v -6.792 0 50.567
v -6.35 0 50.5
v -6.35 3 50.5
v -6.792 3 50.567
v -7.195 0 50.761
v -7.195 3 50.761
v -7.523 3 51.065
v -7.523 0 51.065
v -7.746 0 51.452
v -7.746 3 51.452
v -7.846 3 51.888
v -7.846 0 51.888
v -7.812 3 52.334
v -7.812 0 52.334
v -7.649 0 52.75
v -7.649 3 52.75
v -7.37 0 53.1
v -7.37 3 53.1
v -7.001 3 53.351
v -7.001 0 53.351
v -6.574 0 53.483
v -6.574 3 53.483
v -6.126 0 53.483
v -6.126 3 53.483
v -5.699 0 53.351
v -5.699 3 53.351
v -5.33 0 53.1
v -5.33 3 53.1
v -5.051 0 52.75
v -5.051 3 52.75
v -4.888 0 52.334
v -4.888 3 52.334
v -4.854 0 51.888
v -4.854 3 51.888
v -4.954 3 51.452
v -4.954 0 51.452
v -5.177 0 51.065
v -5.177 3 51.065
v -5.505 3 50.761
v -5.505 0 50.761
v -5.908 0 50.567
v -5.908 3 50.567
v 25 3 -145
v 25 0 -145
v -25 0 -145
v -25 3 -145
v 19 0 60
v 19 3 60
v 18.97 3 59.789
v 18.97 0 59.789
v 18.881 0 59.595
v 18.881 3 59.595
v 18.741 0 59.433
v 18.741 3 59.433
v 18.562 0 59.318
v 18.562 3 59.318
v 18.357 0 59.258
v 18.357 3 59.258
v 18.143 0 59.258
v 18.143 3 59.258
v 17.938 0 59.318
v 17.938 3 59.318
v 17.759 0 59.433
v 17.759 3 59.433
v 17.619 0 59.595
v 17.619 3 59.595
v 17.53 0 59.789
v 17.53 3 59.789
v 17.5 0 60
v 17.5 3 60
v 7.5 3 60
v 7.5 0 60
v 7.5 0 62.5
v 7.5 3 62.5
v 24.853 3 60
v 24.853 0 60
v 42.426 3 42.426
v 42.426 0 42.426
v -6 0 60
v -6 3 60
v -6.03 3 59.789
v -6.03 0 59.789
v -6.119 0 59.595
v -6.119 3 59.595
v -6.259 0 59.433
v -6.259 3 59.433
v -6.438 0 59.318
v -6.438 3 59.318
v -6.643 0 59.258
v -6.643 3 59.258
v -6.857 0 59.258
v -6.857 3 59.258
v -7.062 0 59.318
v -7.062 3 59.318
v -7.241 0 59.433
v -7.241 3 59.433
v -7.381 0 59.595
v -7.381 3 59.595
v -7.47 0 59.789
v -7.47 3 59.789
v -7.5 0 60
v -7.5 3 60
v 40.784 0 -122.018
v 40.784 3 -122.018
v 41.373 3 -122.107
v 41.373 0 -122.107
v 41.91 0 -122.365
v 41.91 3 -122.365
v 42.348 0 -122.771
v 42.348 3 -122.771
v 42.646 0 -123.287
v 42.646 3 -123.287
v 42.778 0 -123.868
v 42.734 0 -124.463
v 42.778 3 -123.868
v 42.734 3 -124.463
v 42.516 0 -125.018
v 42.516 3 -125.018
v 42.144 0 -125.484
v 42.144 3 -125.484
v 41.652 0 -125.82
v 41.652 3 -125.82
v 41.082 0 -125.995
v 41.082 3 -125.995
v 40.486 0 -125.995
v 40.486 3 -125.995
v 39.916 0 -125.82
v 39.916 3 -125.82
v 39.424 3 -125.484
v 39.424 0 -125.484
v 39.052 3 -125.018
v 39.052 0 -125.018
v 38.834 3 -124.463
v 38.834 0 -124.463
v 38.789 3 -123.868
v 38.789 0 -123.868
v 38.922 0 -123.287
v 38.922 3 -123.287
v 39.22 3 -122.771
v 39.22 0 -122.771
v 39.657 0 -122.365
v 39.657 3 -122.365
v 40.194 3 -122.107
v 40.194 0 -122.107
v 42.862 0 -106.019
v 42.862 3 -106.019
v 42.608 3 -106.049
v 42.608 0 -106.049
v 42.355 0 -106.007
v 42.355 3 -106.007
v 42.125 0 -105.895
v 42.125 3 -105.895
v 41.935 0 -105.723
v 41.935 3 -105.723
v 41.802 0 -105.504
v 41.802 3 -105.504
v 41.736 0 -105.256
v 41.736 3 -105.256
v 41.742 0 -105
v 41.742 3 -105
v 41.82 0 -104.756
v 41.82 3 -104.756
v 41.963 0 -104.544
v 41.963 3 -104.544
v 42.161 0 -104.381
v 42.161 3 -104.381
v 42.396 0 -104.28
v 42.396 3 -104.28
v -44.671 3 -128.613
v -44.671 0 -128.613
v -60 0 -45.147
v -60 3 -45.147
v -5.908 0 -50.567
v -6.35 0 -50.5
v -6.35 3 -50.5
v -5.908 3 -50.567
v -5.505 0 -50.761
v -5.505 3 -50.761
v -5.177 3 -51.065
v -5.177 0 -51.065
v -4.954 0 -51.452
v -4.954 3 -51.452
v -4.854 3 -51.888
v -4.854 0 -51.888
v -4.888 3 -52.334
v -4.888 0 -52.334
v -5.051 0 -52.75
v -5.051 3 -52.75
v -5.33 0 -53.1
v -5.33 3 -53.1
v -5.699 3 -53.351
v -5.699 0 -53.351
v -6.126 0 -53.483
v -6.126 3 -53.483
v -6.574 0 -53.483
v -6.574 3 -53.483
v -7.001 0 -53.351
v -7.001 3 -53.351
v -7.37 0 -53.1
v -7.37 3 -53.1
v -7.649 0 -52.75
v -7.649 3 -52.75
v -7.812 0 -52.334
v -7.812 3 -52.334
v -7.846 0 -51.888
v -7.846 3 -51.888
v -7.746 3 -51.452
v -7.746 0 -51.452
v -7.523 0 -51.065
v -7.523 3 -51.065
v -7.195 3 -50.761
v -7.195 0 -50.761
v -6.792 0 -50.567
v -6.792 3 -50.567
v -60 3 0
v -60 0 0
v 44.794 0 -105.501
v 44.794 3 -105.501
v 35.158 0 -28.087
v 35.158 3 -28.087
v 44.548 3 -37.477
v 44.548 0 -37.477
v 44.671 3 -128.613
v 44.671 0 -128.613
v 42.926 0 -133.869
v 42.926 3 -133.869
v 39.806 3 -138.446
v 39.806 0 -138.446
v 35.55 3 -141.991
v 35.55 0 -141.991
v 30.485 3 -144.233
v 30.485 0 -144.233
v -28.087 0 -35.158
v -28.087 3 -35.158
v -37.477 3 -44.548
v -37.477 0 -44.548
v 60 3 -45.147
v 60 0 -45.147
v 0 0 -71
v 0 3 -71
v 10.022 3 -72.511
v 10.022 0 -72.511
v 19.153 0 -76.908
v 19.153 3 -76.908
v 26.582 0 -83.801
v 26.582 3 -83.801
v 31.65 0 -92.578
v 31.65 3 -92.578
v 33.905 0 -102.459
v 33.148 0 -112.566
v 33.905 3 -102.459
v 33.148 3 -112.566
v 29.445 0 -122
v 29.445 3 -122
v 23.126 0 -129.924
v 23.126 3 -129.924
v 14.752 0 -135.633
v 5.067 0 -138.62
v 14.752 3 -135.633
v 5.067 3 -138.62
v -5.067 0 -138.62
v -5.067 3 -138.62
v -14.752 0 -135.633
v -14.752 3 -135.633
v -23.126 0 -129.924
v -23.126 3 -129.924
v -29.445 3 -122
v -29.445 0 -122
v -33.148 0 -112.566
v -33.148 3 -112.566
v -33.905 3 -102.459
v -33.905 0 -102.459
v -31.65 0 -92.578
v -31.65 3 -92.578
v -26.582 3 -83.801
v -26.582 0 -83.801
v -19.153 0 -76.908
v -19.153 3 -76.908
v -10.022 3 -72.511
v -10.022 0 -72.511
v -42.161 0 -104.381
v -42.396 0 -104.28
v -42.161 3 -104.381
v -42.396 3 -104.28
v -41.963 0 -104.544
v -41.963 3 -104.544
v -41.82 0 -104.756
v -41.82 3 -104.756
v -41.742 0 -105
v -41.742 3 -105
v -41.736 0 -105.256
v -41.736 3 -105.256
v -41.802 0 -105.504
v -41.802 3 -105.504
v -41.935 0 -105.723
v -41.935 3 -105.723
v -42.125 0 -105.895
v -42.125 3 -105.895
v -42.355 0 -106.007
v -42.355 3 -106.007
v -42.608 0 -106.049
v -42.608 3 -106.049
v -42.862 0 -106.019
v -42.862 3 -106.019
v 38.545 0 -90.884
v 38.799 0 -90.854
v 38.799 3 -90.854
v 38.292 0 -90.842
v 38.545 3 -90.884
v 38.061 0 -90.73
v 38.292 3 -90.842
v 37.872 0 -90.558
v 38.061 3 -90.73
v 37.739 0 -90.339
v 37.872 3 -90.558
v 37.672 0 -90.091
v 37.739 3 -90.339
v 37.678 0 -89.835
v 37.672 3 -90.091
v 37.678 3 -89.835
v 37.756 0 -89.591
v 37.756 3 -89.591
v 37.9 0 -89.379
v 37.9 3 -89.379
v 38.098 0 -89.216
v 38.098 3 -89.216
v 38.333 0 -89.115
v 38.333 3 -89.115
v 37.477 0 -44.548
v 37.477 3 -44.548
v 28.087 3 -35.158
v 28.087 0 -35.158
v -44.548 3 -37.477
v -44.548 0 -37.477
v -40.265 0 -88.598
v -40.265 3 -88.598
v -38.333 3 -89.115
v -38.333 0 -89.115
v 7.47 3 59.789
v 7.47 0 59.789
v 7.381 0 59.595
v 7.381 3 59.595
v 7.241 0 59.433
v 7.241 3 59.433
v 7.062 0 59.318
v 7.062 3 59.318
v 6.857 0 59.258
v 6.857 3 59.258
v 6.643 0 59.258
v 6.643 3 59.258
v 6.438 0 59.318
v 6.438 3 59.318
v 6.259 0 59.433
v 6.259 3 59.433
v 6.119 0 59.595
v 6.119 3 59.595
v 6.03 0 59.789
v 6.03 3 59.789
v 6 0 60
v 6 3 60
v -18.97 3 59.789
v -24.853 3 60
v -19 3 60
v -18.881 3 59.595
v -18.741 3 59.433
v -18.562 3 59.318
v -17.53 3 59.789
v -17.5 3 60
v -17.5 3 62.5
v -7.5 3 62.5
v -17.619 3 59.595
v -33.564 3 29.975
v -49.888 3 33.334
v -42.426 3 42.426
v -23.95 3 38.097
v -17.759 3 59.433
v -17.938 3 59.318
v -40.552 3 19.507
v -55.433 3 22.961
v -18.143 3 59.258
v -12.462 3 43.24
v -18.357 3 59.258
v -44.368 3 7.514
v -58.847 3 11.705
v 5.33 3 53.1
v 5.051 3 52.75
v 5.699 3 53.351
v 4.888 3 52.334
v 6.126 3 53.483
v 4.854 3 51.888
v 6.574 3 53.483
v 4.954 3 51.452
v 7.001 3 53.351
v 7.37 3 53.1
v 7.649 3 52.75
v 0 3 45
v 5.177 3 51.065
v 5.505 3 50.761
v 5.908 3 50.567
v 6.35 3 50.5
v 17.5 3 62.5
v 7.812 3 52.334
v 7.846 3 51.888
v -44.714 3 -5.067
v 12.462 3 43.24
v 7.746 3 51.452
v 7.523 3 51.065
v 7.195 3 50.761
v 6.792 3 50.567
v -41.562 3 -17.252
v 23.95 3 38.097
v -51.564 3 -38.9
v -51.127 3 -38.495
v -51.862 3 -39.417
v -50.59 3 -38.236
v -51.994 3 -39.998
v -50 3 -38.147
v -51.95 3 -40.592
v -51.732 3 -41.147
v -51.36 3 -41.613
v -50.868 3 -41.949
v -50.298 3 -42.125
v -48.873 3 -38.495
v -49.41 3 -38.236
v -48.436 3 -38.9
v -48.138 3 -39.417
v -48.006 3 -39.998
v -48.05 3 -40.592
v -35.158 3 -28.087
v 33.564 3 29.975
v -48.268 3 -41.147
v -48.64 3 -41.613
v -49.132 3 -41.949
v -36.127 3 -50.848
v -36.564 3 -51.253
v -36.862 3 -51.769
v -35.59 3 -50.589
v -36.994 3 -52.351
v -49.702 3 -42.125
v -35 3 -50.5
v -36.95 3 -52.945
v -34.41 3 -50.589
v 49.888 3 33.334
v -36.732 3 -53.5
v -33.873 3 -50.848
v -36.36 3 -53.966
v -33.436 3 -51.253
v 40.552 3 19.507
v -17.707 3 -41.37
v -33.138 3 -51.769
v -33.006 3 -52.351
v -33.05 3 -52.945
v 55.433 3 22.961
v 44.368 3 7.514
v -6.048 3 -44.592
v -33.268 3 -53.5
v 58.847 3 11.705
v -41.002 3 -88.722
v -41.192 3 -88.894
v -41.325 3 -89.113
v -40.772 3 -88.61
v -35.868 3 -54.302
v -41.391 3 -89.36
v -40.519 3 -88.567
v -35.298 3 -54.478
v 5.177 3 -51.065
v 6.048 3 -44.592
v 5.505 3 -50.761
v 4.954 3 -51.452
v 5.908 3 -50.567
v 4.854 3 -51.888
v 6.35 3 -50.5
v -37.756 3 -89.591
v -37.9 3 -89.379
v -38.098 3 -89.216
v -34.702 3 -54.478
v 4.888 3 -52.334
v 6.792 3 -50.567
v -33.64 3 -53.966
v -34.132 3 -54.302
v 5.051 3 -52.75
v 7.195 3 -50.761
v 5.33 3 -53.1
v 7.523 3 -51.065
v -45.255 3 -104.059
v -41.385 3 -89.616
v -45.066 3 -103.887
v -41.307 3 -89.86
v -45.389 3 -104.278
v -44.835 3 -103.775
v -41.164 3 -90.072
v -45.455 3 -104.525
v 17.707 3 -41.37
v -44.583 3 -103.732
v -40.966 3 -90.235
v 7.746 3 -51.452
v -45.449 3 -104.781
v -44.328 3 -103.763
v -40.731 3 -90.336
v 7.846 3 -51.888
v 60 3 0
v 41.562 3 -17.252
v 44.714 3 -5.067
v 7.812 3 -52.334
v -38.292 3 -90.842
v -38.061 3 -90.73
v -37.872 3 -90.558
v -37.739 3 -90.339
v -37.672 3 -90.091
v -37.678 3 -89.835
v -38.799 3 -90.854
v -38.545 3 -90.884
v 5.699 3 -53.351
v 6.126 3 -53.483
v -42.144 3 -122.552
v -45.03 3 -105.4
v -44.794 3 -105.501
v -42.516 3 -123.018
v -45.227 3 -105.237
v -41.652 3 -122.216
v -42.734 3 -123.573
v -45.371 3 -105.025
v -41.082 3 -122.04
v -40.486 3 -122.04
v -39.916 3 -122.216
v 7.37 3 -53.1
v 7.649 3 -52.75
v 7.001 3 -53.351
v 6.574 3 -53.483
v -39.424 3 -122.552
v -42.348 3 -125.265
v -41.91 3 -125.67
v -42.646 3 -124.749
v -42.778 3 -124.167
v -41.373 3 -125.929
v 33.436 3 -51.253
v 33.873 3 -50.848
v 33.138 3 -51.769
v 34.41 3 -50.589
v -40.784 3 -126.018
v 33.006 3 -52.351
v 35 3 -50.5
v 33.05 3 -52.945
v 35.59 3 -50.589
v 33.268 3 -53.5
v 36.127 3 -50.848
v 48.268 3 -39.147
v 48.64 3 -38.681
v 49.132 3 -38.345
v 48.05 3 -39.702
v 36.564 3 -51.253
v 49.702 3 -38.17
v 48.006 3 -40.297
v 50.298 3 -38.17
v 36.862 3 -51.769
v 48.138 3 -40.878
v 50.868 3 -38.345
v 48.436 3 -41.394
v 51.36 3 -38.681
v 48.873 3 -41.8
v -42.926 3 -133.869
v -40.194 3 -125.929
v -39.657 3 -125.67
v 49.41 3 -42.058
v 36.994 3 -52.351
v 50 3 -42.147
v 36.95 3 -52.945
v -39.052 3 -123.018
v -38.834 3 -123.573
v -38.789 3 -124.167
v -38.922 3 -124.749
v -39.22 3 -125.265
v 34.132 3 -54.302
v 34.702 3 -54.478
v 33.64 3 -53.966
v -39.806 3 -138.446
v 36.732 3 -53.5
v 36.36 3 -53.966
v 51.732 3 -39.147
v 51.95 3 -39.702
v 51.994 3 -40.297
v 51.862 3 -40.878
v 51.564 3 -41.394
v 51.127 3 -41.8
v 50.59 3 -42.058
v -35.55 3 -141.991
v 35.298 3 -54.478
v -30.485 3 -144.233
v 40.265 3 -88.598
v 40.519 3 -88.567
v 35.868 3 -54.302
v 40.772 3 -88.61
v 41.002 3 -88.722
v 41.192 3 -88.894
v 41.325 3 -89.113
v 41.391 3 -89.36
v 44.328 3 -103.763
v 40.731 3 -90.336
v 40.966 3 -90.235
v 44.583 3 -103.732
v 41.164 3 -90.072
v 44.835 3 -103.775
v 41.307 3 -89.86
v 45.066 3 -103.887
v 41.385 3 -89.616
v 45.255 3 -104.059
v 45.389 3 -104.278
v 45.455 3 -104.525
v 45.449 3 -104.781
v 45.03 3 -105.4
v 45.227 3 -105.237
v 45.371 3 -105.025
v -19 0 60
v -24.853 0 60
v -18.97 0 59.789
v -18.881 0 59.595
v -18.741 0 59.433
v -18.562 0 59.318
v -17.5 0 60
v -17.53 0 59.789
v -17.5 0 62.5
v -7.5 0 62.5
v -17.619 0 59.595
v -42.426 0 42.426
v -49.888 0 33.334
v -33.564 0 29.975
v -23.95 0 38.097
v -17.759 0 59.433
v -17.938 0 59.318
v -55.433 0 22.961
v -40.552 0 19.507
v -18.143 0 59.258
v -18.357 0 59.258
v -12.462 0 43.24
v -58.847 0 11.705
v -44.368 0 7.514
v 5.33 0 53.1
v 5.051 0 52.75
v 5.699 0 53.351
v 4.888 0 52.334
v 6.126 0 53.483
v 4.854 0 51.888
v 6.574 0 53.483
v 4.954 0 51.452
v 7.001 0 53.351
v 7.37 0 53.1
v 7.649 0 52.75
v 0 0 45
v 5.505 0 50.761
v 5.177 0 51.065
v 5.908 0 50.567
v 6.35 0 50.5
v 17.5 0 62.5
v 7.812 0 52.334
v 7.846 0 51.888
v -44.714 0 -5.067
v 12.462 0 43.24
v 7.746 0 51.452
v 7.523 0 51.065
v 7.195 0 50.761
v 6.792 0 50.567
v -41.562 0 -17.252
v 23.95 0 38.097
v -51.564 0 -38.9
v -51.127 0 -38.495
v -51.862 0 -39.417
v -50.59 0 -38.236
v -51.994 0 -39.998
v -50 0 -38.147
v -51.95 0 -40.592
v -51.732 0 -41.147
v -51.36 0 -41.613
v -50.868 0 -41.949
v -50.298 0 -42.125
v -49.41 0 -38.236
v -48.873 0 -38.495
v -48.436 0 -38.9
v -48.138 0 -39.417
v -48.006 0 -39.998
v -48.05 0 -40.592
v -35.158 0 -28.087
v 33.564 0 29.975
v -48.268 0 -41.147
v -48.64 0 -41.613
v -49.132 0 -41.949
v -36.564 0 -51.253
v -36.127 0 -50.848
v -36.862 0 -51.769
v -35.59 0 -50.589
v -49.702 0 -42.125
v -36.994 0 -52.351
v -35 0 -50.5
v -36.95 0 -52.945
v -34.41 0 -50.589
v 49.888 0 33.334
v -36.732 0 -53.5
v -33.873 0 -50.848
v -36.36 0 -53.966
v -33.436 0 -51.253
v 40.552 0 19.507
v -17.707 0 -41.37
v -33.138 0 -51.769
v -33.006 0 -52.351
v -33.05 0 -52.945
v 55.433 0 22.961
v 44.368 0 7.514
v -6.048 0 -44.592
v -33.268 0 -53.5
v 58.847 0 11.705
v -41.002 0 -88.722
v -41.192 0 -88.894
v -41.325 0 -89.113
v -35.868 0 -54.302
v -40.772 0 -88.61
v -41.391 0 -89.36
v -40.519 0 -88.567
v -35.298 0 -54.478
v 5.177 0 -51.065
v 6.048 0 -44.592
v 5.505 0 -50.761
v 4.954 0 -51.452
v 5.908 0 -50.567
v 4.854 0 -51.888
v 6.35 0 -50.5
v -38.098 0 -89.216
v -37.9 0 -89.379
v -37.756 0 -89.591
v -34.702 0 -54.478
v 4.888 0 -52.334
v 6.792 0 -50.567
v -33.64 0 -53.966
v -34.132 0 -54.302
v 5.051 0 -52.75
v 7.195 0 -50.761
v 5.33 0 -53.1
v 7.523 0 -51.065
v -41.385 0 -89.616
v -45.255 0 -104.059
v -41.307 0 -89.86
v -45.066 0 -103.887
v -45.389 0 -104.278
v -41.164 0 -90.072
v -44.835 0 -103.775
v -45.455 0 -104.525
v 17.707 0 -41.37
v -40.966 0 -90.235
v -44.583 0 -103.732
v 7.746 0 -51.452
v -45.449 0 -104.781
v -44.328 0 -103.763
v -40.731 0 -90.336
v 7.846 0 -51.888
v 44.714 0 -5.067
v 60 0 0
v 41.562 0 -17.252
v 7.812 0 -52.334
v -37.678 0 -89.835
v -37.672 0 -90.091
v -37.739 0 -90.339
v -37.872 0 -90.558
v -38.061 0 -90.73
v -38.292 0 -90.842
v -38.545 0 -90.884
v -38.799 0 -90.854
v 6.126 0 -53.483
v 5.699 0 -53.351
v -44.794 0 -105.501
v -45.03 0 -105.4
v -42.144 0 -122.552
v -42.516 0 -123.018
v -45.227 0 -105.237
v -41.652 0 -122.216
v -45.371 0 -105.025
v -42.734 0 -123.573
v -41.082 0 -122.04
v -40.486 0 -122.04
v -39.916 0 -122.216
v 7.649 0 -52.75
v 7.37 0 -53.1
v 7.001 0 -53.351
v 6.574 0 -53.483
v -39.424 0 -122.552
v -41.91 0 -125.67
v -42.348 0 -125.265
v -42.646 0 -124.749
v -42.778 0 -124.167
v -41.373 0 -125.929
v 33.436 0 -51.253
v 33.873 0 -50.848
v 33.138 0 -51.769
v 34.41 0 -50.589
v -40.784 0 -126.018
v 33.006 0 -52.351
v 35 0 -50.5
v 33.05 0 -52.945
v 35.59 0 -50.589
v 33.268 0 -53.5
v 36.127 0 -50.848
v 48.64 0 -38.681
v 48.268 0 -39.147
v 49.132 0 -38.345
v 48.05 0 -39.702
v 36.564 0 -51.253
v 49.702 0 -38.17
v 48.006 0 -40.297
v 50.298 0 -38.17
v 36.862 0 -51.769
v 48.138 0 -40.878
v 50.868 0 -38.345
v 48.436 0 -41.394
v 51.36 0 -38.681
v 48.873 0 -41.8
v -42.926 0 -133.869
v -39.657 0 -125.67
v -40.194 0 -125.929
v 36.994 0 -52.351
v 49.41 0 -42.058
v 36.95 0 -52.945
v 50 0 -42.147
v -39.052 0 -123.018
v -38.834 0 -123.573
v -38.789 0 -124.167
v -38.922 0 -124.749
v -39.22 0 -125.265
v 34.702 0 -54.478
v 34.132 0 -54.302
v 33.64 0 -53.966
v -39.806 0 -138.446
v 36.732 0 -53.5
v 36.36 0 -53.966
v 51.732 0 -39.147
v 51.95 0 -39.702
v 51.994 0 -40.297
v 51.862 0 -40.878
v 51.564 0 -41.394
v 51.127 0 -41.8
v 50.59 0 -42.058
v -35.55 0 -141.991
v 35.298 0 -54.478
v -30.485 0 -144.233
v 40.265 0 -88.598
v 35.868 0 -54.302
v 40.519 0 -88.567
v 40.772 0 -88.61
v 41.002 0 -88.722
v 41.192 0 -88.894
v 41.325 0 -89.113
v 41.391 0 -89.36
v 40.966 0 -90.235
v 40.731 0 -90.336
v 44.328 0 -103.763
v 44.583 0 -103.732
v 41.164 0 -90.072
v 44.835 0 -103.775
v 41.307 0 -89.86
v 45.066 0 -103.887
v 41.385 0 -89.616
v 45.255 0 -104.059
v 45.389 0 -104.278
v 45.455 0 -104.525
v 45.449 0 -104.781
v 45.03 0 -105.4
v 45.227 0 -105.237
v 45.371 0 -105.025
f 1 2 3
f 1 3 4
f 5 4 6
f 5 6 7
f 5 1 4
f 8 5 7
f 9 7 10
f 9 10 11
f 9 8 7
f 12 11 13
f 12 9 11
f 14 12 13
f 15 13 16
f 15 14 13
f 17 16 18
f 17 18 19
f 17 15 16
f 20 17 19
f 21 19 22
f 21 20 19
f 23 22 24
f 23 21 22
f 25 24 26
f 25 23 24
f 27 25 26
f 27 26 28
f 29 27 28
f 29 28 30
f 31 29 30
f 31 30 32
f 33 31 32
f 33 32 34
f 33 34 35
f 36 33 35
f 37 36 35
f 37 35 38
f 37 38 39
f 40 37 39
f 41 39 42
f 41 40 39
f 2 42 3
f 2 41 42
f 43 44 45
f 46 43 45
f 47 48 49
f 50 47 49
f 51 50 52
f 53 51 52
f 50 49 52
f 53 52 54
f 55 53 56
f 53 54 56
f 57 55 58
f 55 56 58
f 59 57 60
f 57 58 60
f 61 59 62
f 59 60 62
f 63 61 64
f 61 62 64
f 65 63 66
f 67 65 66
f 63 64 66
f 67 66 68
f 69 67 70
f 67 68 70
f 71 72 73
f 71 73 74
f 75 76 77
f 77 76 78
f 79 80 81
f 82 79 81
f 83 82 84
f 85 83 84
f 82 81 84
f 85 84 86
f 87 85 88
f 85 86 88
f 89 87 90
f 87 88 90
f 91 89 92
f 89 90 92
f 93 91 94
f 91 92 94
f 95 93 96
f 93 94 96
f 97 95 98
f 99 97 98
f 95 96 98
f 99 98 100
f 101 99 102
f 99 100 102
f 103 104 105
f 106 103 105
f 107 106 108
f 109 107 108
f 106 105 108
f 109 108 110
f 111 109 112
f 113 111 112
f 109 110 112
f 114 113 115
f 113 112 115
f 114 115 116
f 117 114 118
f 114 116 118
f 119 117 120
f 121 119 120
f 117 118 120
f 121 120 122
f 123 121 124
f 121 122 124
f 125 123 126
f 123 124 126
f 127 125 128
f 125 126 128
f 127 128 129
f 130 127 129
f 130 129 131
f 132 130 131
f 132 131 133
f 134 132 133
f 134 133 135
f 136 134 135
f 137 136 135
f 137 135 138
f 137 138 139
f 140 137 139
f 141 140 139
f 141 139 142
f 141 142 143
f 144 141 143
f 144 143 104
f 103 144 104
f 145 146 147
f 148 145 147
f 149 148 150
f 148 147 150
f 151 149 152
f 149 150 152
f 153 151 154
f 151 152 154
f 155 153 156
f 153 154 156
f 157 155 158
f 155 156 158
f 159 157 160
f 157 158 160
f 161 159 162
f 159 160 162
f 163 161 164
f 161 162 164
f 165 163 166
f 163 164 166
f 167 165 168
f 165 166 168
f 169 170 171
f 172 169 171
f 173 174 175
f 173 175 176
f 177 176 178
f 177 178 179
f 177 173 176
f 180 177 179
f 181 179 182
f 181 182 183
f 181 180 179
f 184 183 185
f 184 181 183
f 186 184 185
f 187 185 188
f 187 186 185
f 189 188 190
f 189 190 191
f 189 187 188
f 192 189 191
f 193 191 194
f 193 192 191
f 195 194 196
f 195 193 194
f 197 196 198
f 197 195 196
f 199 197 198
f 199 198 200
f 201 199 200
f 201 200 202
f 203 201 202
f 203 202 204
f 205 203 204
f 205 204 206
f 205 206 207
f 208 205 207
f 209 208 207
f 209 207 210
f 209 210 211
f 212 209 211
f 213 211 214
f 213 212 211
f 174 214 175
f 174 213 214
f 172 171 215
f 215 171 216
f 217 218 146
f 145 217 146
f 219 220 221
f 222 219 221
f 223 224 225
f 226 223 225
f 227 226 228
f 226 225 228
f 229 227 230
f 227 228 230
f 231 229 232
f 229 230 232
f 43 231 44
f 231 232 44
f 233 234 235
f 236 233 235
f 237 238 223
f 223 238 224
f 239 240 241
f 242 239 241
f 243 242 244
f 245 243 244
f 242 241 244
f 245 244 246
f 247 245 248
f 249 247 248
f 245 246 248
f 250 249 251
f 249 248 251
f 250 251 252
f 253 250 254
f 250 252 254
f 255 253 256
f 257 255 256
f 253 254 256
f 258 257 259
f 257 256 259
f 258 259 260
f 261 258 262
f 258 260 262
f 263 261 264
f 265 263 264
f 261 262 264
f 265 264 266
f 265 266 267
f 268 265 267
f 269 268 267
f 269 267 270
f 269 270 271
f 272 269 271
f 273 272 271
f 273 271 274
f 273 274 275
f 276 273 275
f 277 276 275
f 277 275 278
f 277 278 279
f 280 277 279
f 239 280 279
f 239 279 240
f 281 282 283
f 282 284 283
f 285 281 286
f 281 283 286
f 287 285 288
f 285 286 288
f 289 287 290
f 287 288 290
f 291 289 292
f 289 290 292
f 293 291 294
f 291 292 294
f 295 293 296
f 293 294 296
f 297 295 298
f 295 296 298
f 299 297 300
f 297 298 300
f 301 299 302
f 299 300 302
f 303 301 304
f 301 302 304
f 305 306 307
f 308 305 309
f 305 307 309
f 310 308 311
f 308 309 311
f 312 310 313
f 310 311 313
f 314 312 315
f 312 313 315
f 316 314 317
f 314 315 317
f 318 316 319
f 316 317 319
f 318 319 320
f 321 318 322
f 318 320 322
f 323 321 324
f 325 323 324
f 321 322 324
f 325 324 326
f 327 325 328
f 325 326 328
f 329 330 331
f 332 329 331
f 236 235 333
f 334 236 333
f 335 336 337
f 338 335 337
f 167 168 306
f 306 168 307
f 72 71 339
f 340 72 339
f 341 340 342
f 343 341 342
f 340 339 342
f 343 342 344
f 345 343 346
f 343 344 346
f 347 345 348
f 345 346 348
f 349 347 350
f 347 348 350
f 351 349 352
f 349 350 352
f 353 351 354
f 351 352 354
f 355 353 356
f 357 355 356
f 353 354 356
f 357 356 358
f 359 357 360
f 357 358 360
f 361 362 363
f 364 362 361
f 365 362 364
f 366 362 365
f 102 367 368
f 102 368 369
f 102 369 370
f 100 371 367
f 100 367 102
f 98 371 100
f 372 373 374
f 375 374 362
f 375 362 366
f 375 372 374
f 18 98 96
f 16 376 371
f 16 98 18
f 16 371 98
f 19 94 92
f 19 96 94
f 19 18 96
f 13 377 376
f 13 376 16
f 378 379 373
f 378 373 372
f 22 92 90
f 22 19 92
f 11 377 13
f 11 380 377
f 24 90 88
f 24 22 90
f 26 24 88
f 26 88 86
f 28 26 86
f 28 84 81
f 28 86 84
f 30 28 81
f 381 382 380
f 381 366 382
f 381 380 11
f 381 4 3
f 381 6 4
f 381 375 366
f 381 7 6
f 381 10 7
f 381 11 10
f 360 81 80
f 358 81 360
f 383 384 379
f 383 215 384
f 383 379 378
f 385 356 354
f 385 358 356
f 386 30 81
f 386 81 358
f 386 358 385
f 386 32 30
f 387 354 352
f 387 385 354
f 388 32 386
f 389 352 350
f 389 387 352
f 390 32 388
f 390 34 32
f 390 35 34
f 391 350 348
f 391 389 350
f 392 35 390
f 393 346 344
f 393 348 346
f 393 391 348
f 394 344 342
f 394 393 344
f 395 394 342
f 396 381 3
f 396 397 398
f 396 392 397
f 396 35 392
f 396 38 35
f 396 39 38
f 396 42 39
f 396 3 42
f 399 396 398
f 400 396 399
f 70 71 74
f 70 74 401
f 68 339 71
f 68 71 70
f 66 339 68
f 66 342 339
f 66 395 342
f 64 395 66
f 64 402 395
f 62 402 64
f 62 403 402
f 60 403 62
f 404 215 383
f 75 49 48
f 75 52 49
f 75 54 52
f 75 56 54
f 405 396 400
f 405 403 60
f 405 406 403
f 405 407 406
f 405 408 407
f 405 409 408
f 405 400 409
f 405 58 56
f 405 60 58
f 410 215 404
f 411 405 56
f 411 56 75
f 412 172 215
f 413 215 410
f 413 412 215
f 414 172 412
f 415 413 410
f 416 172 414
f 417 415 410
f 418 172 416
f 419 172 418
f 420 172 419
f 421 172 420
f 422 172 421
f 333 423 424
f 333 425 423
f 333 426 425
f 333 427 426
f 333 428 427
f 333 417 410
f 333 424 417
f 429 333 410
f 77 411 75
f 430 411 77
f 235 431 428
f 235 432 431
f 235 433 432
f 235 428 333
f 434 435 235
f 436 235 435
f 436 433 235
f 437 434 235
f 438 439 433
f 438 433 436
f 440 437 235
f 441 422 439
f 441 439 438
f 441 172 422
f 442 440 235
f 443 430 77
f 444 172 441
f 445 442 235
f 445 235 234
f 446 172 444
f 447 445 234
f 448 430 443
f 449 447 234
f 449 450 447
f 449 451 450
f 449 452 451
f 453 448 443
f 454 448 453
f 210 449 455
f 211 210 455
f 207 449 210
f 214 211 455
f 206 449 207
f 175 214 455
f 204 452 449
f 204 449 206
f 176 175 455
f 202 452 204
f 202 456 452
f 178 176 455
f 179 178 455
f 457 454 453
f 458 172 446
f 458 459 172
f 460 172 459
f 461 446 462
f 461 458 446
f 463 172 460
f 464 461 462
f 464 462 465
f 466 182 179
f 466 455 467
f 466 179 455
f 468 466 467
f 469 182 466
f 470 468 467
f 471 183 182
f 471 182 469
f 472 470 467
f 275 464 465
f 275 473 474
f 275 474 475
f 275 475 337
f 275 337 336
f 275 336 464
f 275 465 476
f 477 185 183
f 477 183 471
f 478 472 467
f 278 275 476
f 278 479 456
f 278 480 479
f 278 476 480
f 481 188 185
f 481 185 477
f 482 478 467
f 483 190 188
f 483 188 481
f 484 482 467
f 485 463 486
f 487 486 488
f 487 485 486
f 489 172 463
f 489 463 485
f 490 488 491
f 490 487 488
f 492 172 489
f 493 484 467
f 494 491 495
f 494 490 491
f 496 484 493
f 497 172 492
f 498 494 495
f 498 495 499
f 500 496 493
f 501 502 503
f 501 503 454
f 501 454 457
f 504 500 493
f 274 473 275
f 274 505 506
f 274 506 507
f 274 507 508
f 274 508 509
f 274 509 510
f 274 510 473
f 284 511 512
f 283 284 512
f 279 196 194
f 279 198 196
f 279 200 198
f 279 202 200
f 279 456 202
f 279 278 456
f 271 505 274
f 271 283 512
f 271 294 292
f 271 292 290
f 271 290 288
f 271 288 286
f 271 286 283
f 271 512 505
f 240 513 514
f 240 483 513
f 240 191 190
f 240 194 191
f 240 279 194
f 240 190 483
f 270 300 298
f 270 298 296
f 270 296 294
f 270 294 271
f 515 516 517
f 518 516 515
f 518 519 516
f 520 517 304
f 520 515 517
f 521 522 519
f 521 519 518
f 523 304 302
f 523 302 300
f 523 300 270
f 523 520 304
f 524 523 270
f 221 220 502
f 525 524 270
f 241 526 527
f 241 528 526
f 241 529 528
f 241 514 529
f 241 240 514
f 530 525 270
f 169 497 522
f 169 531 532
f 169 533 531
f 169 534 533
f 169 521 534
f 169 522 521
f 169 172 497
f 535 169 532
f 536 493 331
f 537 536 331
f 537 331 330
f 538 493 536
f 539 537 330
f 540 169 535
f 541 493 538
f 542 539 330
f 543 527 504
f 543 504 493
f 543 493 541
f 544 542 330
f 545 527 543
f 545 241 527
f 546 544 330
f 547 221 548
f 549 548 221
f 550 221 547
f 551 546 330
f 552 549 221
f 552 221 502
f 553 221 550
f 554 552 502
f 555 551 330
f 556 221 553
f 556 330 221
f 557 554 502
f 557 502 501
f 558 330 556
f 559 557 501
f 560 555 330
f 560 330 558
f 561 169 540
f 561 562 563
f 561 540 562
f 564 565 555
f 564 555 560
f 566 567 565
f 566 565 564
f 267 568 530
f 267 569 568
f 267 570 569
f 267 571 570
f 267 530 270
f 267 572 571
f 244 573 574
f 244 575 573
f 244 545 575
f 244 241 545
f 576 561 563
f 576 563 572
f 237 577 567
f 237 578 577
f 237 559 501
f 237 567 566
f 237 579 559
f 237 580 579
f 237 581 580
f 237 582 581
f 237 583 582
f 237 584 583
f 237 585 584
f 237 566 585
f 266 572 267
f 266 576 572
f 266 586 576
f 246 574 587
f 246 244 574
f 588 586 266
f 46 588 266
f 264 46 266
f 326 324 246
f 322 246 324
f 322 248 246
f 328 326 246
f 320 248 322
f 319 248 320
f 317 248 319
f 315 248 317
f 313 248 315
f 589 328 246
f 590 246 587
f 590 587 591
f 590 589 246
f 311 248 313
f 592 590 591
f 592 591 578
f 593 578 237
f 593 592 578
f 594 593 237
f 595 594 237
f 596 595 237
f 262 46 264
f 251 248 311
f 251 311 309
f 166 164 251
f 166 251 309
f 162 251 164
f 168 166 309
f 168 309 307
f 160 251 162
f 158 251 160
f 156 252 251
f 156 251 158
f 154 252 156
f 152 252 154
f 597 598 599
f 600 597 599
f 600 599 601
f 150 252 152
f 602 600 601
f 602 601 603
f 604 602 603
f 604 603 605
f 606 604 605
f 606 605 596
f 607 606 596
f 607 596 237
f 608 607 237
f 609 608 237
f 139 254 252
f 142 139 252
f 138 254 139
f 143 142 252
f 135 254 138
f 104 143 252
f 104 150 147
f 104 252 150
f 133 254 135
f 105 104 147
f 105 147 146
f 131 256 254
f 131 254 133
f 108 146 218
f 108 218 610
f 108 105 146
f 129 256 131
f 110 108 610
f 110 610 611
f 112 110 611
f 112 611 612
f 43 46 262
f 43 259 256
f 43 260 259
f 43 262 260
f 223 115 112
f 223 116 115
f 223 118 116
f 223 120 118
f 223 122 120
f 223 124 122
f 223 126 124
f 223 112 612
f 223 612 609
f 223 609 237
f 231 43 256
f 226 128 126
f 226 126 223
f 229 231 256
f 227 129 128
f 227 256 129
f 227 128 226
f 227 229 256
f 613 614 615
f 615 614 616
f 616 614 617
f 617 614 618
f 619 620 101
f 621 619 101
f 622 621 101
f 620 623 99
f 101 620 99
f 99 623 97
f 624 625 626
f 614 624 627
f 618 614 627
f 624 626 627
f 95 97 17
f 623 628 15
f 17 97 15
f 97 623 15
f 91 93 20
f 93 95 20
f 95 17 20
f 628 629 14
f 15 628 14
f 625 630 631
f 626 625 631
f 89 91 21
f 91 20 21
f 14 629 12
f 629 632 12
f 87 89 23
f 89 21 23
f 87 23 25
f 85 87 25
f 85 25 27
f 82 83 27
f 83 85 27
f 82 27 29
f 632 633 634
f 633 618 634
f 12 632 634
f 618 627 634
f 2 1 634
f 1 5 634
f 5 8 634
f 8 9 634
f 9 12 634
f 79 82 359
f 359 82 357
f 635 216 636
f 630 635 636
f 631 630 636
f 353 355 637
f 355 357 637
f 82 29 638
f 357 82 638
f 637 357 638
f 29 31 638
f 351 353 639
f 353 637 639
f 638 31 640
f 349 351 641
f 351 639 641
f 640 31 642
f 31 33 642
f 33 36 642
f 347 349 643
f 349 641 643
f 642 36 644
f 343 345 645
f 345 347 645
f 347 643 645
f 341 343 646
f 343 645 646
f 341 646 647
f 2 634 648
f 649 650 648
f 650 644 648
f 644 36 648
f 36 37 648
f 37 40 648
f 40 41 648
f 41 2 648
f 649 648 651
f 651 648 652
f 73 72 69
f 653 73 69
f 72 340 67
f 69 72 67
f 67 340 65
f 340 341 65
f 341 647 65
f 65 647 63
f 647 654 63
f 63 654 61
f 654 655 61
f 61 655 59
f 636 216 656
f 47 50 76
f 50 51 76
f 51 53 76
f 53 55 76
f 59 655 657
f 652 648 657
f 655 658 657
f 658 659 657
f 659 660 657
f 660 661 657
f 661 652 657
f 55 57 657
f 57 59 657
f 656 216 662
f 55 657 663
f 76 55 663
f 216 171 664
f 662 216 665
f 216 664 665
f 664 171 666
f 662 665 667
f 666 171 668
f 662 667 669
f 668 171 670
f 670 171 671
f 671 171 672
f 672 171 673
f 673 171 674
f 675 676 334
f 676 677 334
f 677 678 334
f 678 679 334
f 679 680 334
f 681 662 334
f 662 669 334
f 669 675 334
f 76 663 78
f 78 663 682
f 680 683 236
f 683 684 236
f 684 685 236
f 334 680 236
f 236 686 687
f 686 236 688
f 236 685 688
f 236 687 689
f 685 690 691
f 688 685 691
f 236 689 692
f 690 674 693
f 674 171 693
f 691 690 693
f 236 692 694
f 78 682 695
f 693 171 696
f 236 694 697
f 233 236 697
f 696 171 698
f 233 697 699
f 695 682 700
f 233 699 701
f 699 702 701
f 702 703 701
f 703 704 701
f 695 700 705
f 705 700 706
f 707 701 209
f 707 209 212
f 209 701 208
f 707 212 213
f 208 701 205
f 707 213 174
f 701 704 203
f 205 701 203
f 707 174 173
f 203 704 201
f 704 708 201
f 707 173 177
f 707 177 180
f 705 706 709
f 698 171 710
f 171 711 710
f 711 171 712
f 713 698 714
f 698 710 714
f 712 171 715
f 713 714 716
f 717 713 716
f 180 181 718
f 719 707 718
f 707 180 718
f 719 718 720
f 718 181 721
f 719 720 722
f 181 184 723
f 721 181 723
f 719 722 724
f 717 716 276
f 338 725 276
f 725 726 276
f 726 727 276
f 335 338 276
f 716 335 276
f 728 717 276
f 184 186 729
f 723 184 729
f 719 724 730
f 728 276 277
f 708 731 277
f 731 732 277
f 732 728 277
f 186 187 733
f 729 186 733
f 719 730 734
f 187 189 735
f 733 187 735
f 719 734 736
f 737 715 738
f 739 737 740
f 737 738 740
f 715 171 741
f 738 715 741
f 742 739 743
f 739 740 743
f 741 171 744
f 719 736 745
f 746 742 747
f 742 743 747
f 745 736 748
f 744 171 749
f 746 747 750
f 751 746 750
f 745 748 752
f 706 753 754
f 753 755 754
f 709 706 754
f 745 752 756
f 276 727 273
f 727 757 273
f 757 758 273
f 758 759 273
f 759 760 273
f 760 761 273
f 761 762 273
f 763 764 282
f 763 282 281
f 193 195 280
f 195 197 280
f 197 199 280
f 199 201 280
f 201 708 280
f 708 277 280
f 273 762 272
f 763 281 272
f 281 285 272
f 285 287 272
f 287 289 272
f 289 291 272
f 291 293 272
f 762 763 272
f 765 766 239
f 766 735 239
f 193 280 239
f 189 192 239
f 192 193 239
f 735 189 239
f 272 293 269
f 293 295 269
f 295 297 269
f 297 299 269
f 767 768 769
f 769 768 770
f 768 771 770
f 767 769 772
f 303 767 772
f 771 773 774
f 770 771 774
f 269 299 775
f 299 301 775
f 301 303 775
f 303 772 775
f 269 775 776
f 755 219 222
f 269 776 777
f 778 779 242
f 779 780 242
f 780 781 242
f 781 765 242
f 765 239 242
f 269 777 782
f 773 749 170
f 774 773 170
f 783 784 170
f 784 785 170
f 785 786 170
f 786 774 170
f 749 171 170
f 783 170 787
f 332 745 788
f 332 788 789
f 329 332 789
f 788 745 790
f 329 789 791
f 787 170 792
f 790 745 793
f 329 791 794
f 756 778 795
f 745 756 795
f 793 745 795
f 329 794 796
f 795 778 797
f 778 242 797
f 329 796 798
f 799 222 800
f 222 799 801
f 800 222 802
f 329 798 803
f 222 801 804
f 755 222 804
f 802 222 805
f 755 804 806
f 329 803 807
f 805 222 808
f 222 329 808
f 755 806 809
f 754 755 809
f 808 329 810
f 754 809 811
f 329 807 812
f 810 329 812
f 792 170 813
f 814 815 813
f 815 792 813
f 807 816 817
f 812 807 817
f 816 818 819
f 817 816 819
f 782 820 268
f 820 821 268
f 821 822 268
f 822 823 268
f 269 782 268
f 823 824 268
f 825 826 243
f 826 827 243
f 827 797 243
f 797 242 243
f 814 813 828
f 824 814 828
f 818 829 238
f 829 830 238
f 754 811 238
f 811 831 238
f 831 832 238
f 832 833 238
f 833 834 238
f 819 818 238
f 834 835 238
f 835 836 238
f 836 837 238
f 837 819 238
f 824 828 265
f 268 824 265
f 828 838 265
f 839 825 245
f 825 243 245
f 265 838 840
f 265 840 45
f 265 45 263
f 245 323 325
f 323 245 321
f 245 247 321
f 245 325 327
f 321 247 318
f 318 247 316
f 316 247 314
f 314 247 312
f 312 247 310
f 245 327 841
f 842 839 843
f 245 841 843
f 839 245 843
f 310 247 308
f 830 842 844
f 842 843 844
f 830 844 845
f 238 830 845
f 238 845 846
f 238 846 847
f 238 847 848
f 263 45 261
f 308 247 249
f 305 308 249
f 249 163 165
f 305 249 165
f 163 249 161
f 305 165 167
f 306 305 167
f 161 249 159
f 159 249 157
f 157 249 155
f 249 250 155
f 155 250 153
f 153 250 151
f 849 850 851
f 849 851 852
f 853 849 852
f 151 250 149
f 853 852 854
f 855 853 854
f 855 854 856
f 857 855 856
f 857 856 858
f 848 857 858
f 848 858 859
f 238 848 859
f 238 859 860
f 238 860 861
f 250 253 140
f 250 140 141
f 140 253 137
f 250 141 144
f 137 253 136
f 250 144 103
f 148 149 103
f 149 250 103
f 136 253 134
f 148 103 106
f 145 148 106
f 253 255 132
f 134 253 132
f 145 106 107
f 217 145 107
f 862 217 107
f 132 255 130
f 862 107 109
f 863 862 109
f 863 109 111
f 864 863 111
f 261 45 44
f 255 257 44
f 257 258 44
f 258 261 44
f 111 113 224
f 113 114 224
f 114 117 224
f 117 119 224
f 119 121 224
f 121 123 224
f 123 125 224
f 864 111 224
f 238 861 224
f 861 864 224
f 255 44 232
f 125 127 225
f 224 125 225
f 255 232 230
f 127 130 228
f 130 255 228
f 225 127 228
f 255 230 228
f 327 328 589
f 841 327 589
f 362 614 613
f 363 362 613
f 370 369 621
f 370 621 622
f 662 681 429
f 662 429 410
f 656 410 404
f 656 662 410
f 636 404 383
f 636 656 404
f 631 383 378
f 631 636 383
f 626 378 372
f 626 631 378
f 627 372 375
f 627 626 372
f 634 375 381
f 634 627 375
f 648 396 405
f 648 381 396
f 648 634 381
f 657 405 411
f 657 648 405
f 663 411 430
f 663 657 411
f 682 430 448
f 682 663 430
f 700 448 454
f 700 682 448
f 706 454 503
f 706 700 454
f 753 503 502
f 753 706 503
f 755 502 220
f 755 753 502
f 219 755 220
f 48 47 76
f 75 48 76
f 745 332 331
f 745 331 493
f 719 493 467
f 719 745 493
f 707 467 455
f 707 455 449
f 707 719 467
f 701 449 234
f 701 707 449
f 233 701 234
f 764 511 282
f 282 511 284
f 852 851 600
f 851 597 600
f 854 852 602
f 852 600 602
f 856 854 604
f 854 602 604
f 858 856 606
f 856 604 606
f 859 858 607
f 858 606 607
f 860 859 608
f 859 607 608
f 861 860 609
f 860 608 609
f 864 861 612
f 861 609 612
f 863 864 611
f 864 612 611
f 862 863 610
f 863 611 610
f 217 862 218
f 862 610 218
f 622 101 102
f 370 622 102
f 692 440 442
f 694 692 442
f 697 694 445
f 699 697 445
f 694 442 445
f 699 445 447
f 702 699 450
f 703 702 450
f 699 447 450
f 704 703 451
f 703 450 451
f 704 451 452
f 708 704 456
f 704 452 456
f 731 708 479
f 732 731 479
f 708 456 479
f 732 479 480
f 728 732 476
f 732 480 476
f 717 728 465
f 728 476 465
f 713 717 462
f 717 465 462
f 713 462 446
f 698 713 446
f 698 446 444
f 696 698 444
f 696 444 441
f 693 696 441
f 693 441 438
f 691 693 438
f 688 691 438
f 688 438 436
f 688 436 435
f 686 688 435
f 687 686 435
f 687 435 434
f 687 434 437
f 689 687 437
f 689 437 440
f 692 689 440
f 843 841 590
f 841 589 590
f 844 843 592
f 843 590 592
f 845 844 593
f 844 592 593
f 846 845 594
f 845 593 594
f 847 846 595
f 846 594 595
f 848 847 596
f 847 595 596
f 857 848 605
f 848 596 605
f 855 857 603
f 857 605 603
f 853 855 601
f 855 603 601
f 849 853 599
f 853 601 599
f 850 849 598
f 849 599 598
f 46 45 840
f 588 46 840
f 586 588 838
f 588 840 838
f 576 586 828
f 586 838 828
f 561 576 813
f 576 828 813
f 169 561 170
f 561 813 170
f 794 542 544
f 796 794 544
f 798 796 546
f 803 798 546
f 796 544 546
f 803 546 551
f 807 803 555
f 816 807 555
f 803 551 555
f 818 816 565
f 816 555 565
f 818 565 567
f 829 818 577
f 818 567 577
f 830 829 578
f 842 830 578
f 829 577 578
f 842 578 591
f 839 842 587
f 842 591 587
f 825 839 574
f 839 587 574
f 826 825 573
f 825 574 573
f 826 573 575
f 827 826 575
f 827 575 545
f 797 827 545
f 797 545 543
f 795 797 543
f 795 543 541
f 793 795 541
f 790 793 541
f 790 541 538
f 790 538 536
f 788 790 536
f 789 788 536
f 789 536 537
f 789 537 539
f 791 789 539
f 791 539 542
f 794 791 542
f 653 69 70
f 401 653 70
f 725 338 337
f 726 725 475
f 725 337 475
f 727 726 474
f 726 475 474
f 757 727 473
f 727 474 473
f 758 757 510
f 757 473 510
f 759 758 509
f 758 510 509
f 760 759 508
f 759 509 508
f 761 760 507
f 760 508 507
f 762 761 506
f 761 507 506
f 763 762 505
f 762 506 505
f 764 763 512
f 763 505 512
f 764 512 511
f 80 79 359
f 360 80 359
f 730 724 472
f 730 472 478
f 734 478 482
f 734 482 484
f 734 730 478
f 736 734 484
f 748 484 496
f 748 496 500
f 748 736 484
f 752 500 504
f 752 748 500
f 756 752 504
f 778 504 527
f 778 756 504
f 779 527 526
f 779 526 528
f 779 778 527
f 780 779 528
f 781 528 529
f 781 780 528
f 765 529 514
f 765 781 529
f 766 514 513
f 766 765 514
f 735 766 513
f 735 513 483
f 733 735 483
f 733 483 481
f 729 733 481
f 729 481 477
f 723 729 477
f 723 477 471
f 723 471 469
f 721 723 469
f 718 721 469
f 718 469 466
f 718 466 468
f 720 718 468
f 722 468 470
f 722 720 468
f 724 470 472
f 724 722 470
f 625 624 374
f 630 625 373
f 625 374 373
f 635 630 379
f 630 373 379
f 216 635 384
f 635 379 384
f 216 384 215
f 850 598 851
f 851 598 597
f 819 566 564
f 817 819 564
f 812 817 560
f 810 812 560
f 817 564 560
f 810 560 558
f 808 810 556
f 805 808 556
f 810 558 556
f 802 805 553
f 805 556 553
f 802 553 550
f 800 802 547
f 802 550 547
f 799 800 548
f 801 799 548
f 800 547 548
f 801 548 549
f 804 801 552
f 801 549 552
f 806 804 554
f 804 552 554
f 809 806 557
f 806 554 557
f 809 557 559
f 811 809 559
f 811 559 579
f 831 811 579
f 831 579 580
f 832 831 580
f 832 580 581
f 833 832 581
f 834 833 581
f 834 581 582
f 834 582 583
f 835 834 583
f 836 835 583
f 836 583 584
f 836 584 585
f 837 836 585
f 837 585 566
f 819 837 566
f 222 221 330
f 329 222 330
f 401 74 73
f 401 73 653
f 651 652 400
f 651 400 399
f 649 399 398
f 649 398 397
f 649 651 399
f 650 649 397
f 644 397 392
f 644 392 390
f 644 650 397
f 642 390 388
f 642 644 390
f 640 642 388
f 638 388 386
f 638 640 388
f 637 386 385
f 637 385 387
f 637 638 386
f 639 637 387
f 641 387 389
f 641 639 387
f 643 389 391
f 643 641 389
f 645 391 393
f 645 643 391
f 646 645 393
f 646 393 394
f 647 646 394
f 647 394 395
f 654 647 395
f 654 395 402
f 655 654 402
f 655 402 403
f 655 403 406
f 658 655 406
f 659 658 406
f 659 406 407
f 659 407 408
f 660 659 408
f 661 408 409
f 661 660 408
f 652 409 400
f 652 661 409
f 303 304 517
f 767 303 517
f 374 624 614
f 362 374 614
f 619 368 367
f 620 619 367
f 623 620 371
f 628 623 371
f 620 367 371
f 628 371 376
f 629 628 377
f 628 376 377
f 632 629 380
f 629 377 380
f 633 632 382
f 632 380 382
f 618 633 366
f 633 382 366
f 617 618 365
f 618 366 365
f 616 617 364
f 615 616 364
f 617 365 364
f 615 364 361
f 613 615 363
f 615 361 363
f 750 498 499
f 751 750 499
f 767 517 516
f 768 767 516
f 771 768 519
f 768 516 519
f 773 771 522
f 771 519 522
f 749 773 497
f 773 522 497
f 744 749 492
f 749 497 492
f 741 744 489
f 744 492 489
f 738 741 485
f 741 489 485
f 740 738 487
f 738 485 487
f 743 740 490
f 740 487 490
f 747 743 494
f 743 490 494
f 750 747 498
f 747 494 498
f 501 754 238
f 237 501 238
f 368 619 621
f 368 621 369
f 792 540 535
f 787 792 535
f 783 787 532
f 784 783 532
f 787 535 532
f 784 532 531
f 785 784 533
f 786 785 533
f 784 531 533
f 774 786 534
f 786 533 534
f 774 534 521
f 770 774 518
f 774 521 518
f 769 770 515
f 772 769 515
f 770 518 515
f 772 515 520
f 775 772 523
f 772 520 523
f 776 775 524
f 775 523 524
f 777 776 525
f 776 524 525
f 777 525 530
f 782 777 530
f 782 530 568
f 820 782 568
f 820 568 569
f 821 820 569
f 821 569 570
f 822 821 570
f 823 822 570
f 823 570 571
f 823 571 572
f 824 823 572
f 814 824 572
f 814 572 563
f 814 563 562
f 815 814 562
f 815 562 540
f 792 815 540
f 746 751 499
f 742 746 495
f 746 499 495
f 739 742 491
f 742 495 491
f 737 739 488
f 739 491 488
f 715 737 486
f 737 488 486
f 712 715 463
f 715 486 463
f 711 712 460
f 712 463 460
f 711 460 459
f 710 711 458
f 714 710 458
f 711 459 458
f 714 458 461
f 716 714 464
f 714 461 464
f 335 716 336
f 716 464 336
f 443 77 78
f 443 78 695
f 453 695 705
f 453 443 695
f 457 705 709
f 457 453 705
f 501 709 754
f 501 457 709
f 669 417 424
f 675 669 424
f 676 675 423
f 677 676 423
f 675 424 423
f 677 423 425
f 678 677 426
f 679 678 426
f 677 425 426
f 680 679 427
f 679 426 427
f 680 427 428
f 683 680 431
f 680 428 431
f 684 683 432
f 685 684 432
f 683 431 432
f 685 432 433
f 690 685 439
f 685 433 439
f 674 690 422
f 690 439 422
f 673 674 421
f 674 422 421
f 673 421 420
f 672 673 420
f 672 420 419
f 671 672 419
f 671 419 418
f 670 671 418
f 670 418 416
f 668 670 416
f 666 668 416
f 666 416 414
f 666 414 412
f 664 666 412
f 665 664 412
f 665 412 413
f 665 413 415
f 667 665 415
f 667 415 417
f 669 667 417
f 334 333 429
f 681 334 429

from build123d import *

# Parameters (mm, degrees)
SKETCH_1_R          = 1.5
SKETCH_1_R_2        = 45
EXTRUDE_1_DEPTH     = 3
SKETCH_2_R          = 34
SKETCH_2_R_2        = 2
CUT_EXTRUDE_1_DEPTH = 157.95222203
SKETCH_3_W          = 10
SKETCH_3_H          = 3
EXTRUDE_2_DEPTH     = 2.5
SKETCH_5_R          = 0.75
CUT_EXTRUDE_2_DEPTH = 157.95222203
SKETCH_8_R          = 0.9
CUT_EXTRUDE_3_DEPTH = 157.95222203


with BuildPart() as part:
    # 草图1 → Extrude 1 (new body)
    with BuildSketch(Plane(origin=(0, 0, 0), x_dir=(1, 0, 0), z_dir=(0, 1, 0))):
        with BuildLine():
            Line((-60, 24.852813742), (-60, -24.852813742))
            Line((-60, -24.852813742), (-24.852813742, -60))
            Line((-24.852813742, -60), (24.852813742, -60))
            Line((24.852813742, -60), (60, -24.852813742))
            Line((60, -24.852813742), (60, 24.852813742))
            Line((60, 24.852813742), (60, 45.147186258))
            Line((60, 45.147186258), (44.671002135, 128.6127102))
            ThreePointArc((44.671002135, 128.6127102), (37.801285013, 140.366427757), (25, 145))
            Line((25, 145), (-25, 145))
            ThreePointArc((-25, 145), (-37.801285013, 140.366427757), (-44.671002135, 128.6127102))
            Line((-44.671002135, 128.6127102), (-60, 45.147186258))
            Line((-60, 45.147186258), (-60, 24.852813742))
        make_face()
        with Locations(Location((-6.35, 52, 0), (0, 0, 270))):
            Circle(SKETCH_1_R, mode=Mode.SUBTRACT)
        with Locations(Location((6.35, 52, 0), (0, 0, 270))):
            Circle(SKETCH_1_R, mode=Mode.SUBTRACT)
        with Locations(Location((6.35, -52, 0), (0, 0, 90))):
            Circle(SKETCH_1_R, mode=Mode.SUBTRACT)
        with Locations(Location((-6.35, -52, 0), (0, 0, 90))):
            Circle(SKETCH_1_R, mode=Mode.SUBTRACT)
        with Locations(Location((0, 0, 0), (0, 0, 270))):
            Circle(SKETCH_1_R_2, mode=Mode.SUBTRACT)
    extrude(amount=EXTRUDE_1_DEPTH)

    # 草图2 → 切除-拉伸1 (cut, through all)
    with BuildSketch(Plane(origin=(0, 3, 0), x_dir=(1, 0, 0), z_dir=(0, 1, 0))):
        with Locations(Location((0, 105, 0), (0, 0, 270))):
            Circle(SKETCH_2_R)
        with Locations(Location((-35, 52.5, 0), (0, 0, 270))):
            Circle(SKETCH_2_R_2)
        with Locations(Location((35, 52.5, 0), (0, 0, 270))):
            Circle(SKETCH_2_R_2)
        with Locations(Location((40.783850417, 124.017821778, 0), (0, 0, 270))):
            Circle(SKETCH_2_R_2)
        with Locations(Location((-40.783850417, 124.017821778, 0), (0, 0, 90))):
            Circle(SKETCH_2_R_2)
        with Locations(Location((-50, 40.147186258, 0), (0, 0, 270))):
            Circle(SKETCH_2_R_2)
        with Locations(Location((50, 40.147186258, 0), (0, 0, 90))):
            Circle(SKETCH_2_R_2)
        Polygon((28.087242696, 35.158310508), (35.158310508, 28.087242696), (44.547727215, 37.476659403), (37.476659403, 44.547727215), align=None)
        Polygon((-37.476659403, 44.547727215), (-44.547727215, 37.476659403), (-35.158310508, 28.087242696), (-28.087242696, 35.158310508), align=None)
    extrude(amount=-CUT_EXTRUDE_1_DEPTH, mode=Mode.SUBTRACT)

    # 草图3 → 凸台-拉伸2 (add)
    with BuildSketch(Plane.XY.offset(60)):
        with Locations((-12.5, 1.5)):
            Rectangle(SKETCH_3_W, SKETCH_3_H)
        with Locations((12.5, 1.5)):
            Rectangle(SKETCH_3_W, SKETCH_3_H)
    extrude(amount=EXTRUDE_2_DEPTH)

    # 草图5 → 切除-拉伸2 (cut, through all)
    with BuildSketch(Plane(origin=(0, 3, 0), x_dir=(1, 0, 0), z_dir=(0, 1, 0))):
        with Locations((-18.25, -60)):
            Circle(SKETCH_5_R)
        with Locations((-6.75, -60)):
            Circle(SKETCH_5_R)
        with Locations((6.75, -60)):
            Circle(SKETCH_5_R)
        with Locations((18.25, -60)):
            Circle(SKETCH_5_R)
        Polygon((-44.794179278, 105.501282313), (-40.264845988, 88.597580353), (-38.332994336, 89.115218444), (-42.862327625, 106.018920404), align=None)
        Polygon((42.862327625, 106.018920404), (38.332994336, 89.115218444), (40.264845988, 88.597580353), (44.794179278, 105.501282313), align=None)
        with BuildLine():
            Line((-60, 0), (-60, -24.852813742))
            Line((-60, -24.852813742), (-42.426406871, -42.426406871))
            ThreePointArc((-42.426406871, -42.426406871), (-55.432771951, -22.961005942), (-60, 0))
        make_face()
        with BuildLine():
            Line((60, -24.852813742), (42.426406871, -42.426406871))
            ThreePointArc((42.426406871, -42.426406871), (55.432771951, -22.961005942), (60, 0))
            Line((60, 0), (60, -24.852813742))
        make_face()
    extrude(amount=-CUT_EXTRUDE_2_DEPTH, mode=Mode.SUBTRACT)

    # 草图8 → 切除-拉伸3 (cut, through all)
    with BuildSketch(Plane(origin=(0, 3, 0), x_dir=(1, 0, 0), z_dir=(0, 1, 0))):
        with Locations((-44.561242137, 104.63194907)):
            Circle(SKETCH_8_R)
        with Locations((-42.629390484, 105.14958716)):
            Circle(SKETCH_8_R)
        with Locations((-38.565931476, 89.984551687)):
            Circle(SKETCH_8_R)
        with Locations((-40.497783129, 89.466913597)):
            Circle(SKETCH_8_R)
        with Locations((40.497783129, 89.466913597)):
            Circle(SKETCH_8_R)
        with Locations((38.565931476, 89.984551687)):
            Circle(SKETCH_8_R)
        with Locations((42.629390484, 105.14958716)):
            Circle(SKETCH_8_R)
        with Locations((44.561242137, 104.63194907)):
            Circle(SKETCH_8_R)
    extrude(amount=-CUT_EXTRUDE_3_DEPTH, mode=Mode.SUBTRACT)


solid = part.part
